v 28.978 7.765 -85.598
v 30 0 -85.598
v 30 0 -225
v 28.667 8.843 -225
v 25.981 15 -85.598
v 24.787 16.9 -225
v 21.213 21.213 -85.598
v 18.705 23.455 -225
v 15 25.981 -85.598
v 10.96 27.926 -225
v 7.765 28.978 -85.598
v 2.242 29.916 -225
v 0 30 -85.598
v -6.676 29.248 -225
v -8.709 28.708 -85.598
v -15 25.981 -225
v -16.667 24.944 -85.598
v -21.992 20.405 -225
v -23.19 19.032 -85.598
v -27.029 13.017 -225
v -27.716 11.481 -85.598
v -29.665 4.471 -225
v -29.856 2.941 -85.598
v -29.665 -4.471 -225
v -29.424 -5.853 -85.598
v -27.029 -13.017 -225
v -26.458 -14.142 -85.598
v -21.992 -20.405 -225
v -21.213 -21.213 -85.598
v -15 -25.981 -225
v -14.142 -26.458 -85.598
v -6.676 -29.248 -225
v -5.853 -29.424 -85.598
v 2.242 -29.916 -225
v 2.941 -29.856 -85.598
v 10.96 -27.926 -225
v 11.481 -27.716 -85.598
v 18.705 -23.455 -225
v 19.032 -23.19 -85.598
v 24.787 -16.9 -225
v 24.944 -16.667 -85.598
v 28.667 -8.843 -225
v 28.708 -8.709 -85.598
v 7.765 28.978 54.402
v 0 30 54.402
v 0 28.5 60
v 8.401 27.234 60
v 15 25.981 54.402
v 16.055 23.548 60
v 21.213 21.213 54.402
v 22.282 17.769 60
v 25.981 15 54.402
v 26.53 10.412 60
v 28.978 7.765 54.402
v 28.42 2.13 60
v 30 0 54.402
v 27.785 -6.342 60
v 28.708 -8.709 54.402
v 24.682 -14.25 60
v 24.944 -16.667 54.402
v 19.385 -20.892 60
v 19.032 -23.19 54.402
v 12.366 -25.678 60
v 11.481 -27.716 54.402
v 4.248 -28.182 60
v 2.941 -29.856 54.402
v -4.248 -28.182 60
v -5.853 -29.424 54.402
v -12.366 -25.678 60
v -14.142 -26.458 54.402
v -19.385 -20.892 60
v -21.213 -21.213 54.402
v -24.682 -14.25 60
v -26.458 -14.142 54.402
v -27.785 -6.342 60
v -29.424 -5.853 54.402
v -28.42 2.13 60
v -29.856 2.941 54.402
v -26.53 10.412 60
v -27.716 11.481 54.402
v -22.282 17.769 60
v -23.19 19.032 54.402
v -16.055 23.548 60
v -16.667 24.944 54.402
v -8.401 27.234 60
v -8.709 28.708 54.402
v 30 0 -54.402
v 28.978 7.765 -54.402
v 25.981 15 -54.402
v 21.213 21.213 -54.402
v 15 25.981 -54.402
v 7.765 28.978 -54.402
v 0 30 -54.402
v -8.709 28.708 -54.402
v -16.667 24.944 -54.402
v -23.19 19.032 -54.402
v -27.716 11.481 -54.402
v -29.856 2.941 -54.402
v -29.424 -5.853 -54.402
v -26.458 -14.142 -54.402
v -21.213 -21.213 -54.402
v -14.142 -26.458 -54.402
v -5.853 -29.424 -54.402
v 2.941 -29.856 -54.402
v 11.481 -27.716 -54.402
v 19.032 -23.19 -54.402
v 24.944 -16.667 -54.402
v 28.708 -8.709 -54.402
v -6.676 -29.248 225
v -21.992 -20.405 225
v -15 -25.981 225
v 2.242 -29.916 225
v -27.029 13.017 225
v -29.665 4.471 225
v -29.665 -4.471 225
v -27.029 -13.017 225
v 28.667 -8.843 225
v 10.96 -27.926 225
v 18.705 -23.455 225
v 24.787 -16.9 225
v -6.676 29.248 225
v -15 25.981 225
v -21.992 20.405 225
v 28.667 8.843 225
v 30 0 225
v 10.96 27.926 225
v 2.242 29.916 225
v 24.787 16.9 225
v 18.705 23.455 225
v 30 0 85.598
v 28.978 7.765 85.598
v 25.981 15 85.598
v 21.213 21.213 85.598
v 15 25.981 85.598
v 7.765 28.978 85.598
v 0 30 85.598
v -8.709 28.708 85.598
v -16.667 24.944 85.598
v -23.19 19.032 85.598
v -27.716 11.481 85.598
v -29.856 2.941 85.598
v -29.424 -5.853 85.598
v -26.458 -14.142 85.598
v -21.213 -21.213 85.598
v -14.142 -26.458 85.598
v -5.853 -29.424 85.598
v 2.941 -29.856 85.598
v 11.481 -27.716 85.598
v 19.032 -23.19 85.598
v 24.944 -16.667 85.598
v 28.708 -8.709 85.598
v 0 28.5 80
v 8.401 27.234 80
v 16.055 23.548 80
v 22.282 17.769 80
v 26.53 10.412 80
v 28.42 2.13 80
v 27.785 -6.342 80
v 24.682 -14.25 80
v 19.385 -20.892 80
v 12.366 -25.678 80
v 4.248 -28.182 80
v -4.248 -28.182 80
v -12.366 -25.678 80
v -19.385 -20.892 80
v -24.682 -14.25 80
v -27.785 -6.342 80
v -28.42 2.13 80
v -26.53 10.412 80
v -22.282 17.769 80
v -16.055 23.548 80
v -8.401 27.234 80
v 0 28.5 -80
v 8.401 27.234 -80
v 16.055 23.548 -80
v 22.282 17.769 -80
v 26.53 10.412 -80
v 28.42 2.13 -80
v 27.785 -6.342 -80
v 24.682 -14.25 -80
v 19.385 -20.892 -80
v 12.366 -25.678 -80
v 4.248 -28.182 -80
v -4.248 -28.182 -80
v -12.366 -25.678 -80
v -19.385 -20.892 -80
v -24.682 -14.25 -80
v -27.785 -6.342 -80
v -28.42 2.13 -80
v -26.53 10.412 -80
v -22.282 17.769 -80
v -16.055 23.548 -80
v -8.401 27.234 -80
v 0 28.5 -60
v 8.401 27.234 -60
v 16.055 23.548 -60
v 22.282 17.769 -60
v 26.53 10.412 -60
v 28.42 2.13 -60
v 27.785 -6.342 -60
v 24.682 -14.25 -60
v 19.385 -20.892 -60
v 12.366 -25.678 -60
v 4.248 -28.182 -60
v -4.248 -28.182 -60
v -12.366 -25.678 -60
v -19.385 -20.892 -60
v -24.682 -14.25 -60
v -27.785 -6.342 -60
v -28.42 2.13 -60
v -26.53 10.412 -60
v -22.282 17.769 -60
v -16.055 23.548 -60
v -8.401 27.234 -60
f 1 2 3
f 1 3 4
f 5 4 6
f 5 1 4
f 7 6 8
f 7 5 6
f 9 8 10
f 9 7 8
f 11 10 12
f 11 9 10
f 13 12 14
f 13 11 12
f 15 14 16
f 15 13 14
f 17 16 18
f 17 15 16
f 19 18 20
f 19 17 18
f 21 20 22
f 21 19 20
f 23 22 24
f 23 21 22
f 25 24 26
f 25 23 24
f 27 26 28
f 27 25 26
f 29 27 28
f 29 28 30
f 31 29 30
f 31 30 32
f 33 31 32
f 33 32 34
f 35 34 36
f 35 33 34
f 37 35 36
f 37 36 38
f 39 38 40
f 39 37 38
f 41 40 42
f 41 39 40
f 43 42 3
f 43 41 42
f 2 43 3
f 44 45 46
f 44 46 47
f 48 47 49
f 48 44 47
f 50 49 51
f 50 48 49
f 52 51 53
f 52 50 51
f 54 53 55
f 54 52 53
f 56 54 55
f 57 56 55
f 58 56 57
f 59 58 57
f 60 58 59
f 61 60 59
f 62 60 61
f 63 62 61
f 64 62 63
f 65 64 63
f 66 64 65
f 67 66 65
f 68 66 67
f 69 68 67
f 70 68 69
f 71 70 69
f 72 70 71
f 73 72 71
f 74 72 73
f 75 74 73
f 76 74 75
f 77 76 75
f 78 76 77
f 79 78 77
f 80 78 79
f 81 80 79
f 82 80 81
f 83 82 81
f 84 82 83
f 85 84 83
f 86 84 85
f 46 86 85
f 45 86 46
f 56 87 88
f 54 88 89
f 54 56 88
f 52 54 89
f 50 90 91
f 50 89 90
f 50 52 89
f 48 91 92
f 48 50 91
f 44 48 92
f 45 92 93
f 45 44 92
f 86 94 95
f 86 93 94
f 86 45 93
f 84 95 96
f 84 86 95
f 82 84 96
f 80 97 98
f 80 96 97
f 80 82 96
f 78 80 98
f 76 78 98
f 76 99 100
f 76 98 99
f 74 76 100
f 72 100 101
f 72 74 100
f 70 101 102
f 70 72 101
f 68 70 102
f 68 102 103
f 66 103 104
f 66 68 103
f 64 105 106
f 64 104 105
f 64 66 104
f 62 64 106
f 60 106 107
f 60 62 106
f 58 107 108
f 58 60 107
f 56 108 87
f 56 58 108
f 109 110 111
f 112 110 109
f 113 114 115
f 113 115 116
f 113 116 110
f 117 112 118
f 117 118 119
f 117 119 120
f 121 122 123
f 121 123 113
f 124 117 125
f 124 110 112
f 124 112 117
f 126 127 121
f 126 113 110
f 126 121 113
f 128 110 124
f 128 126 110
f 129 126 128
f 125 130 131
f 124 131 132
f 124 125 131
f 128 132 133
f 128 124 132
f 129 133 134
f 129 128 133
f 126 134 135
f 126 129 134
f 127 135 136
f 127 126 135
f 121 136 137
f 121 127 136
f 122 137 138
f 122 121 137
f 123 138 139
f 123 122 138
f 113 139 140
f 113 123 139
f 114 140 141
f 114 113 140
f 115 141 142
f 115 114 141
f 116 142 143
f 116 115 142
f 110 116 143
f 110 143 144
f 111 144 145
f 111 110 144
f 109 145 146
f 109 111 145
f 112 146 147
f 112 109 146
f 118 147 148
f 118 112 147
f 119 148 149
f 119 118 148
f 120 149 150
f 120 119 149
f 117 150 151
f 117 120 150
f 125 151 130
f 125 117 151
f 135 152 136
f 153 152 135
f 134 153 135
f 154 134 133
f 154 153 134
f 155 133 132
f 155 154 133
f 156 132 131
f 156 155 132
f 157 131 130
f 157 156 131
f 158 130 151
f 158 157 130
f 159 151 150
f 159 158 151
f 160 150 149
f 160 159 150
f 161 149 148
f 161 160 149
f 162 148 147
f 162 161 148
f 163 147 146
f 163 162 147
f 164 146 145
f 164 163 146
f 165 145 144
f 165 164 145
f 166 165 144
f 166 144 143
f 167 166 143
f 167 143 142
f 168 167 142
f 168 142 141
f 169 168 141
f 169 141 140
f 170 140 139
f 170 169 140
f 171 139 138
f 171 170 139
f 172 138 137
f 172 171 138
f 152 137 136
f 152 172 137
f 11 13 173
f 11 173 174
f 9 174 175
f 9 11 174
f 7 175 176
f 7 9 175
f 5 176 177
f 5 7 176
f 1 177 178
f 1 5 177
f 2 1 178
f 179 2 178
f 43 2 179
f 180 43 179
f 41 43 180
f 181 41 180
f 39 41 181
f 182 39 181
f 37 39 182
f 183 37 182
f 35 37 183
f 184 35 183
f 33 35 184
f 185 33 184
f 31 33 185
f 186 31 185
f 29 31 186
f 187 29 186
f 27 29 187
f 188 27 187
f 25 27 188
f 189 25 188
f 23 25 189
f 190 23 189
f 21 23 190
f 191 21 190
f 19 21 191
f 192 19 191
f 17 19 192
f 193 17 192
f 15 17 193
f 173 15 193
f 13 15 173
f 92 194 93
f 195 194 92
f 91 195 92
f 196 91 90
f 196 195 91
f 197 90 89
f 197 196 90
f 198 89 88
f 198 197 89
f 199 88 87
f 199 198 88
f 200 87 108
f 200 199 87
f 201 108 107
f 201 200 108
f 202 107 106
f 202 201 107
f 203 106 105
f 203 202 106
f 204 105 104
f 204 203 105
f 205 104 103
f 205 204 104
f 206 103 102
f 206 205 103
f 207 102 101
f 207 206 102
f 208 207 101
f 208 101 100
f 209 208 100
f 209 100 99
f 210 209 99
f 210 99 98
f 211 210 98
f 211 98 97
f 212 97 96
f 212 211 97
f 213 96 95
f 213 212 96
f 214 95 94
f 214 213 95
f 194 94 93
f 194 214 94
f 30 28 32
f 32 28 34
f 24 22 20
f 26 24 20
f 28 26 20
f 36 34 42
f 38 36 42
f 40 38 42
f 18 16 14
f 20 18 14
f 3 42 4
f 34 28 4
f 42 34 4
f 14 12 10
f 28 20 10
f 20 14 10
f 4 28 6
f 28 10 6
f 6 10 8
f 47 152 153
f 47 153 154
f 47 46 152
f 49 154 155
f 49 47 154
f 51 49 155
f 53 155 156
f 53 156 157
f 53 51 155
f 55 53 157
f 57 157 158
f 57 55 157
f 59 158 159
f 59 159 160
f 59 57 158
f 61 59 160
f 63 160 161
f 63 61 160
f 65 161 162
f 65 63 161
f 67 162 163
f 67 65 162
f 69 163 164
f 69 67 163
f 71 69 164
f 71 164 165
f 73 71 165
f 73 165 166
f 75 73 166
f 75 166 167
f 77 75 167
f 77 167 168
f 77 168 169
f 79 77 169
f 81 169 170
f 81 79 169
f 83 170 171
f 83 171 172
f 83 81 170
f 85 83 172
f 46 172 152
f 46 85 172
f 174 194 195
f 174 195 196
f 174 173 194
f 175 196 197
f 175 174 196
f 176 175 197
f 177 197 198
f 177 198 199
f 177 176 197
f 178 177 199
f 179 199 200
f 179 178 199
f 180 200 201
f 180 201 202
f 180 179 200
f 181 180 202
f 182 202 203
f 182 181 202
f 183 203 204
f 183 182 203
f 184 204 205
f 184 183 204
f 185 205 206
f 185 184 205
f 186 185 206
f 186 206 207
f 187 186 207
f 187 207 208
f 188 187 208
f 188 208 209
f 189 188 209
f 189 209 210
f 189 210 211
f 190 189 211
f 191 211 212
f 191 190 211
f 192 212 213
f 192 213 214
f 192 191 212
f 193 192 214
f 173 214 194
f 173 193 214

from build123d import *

# Parameters (mm, degrees)
SKETCH1_R           = 30
BOSS_EXTRUDE1_DEPTH = 225


with BuildPart() as part:
    # Sketch1 → Boss-Extrude1 (new body, symmetric)
    with BuildSketch(Plane.XY):
        Circle(SKETCH1_R)
    extrude(amount=BOSS_EXTRUDE1_DEPTH, both=True)

    # Sketch3 → Cut-Revolve1 (revolve, cut)
    with BuildSketch(Plane(origin=(0, 0, 0), x_dir=(0, 0, -1), z_dir=(1, 0, 0))):
        Polygon((-85.598076211, 30), (-80, 28.5), (-60, 28.5), (-54.401923789, 30), align=None)
        Polygon((85.598076211, 30), (54.401923789, 30), (60, 28.5), (80, 28.5), align=None)
    revolve(axis=Axis((0, 0, 225), (0, 0, -1)), mode=Mode.SUBTRACT)


solid = part.part
